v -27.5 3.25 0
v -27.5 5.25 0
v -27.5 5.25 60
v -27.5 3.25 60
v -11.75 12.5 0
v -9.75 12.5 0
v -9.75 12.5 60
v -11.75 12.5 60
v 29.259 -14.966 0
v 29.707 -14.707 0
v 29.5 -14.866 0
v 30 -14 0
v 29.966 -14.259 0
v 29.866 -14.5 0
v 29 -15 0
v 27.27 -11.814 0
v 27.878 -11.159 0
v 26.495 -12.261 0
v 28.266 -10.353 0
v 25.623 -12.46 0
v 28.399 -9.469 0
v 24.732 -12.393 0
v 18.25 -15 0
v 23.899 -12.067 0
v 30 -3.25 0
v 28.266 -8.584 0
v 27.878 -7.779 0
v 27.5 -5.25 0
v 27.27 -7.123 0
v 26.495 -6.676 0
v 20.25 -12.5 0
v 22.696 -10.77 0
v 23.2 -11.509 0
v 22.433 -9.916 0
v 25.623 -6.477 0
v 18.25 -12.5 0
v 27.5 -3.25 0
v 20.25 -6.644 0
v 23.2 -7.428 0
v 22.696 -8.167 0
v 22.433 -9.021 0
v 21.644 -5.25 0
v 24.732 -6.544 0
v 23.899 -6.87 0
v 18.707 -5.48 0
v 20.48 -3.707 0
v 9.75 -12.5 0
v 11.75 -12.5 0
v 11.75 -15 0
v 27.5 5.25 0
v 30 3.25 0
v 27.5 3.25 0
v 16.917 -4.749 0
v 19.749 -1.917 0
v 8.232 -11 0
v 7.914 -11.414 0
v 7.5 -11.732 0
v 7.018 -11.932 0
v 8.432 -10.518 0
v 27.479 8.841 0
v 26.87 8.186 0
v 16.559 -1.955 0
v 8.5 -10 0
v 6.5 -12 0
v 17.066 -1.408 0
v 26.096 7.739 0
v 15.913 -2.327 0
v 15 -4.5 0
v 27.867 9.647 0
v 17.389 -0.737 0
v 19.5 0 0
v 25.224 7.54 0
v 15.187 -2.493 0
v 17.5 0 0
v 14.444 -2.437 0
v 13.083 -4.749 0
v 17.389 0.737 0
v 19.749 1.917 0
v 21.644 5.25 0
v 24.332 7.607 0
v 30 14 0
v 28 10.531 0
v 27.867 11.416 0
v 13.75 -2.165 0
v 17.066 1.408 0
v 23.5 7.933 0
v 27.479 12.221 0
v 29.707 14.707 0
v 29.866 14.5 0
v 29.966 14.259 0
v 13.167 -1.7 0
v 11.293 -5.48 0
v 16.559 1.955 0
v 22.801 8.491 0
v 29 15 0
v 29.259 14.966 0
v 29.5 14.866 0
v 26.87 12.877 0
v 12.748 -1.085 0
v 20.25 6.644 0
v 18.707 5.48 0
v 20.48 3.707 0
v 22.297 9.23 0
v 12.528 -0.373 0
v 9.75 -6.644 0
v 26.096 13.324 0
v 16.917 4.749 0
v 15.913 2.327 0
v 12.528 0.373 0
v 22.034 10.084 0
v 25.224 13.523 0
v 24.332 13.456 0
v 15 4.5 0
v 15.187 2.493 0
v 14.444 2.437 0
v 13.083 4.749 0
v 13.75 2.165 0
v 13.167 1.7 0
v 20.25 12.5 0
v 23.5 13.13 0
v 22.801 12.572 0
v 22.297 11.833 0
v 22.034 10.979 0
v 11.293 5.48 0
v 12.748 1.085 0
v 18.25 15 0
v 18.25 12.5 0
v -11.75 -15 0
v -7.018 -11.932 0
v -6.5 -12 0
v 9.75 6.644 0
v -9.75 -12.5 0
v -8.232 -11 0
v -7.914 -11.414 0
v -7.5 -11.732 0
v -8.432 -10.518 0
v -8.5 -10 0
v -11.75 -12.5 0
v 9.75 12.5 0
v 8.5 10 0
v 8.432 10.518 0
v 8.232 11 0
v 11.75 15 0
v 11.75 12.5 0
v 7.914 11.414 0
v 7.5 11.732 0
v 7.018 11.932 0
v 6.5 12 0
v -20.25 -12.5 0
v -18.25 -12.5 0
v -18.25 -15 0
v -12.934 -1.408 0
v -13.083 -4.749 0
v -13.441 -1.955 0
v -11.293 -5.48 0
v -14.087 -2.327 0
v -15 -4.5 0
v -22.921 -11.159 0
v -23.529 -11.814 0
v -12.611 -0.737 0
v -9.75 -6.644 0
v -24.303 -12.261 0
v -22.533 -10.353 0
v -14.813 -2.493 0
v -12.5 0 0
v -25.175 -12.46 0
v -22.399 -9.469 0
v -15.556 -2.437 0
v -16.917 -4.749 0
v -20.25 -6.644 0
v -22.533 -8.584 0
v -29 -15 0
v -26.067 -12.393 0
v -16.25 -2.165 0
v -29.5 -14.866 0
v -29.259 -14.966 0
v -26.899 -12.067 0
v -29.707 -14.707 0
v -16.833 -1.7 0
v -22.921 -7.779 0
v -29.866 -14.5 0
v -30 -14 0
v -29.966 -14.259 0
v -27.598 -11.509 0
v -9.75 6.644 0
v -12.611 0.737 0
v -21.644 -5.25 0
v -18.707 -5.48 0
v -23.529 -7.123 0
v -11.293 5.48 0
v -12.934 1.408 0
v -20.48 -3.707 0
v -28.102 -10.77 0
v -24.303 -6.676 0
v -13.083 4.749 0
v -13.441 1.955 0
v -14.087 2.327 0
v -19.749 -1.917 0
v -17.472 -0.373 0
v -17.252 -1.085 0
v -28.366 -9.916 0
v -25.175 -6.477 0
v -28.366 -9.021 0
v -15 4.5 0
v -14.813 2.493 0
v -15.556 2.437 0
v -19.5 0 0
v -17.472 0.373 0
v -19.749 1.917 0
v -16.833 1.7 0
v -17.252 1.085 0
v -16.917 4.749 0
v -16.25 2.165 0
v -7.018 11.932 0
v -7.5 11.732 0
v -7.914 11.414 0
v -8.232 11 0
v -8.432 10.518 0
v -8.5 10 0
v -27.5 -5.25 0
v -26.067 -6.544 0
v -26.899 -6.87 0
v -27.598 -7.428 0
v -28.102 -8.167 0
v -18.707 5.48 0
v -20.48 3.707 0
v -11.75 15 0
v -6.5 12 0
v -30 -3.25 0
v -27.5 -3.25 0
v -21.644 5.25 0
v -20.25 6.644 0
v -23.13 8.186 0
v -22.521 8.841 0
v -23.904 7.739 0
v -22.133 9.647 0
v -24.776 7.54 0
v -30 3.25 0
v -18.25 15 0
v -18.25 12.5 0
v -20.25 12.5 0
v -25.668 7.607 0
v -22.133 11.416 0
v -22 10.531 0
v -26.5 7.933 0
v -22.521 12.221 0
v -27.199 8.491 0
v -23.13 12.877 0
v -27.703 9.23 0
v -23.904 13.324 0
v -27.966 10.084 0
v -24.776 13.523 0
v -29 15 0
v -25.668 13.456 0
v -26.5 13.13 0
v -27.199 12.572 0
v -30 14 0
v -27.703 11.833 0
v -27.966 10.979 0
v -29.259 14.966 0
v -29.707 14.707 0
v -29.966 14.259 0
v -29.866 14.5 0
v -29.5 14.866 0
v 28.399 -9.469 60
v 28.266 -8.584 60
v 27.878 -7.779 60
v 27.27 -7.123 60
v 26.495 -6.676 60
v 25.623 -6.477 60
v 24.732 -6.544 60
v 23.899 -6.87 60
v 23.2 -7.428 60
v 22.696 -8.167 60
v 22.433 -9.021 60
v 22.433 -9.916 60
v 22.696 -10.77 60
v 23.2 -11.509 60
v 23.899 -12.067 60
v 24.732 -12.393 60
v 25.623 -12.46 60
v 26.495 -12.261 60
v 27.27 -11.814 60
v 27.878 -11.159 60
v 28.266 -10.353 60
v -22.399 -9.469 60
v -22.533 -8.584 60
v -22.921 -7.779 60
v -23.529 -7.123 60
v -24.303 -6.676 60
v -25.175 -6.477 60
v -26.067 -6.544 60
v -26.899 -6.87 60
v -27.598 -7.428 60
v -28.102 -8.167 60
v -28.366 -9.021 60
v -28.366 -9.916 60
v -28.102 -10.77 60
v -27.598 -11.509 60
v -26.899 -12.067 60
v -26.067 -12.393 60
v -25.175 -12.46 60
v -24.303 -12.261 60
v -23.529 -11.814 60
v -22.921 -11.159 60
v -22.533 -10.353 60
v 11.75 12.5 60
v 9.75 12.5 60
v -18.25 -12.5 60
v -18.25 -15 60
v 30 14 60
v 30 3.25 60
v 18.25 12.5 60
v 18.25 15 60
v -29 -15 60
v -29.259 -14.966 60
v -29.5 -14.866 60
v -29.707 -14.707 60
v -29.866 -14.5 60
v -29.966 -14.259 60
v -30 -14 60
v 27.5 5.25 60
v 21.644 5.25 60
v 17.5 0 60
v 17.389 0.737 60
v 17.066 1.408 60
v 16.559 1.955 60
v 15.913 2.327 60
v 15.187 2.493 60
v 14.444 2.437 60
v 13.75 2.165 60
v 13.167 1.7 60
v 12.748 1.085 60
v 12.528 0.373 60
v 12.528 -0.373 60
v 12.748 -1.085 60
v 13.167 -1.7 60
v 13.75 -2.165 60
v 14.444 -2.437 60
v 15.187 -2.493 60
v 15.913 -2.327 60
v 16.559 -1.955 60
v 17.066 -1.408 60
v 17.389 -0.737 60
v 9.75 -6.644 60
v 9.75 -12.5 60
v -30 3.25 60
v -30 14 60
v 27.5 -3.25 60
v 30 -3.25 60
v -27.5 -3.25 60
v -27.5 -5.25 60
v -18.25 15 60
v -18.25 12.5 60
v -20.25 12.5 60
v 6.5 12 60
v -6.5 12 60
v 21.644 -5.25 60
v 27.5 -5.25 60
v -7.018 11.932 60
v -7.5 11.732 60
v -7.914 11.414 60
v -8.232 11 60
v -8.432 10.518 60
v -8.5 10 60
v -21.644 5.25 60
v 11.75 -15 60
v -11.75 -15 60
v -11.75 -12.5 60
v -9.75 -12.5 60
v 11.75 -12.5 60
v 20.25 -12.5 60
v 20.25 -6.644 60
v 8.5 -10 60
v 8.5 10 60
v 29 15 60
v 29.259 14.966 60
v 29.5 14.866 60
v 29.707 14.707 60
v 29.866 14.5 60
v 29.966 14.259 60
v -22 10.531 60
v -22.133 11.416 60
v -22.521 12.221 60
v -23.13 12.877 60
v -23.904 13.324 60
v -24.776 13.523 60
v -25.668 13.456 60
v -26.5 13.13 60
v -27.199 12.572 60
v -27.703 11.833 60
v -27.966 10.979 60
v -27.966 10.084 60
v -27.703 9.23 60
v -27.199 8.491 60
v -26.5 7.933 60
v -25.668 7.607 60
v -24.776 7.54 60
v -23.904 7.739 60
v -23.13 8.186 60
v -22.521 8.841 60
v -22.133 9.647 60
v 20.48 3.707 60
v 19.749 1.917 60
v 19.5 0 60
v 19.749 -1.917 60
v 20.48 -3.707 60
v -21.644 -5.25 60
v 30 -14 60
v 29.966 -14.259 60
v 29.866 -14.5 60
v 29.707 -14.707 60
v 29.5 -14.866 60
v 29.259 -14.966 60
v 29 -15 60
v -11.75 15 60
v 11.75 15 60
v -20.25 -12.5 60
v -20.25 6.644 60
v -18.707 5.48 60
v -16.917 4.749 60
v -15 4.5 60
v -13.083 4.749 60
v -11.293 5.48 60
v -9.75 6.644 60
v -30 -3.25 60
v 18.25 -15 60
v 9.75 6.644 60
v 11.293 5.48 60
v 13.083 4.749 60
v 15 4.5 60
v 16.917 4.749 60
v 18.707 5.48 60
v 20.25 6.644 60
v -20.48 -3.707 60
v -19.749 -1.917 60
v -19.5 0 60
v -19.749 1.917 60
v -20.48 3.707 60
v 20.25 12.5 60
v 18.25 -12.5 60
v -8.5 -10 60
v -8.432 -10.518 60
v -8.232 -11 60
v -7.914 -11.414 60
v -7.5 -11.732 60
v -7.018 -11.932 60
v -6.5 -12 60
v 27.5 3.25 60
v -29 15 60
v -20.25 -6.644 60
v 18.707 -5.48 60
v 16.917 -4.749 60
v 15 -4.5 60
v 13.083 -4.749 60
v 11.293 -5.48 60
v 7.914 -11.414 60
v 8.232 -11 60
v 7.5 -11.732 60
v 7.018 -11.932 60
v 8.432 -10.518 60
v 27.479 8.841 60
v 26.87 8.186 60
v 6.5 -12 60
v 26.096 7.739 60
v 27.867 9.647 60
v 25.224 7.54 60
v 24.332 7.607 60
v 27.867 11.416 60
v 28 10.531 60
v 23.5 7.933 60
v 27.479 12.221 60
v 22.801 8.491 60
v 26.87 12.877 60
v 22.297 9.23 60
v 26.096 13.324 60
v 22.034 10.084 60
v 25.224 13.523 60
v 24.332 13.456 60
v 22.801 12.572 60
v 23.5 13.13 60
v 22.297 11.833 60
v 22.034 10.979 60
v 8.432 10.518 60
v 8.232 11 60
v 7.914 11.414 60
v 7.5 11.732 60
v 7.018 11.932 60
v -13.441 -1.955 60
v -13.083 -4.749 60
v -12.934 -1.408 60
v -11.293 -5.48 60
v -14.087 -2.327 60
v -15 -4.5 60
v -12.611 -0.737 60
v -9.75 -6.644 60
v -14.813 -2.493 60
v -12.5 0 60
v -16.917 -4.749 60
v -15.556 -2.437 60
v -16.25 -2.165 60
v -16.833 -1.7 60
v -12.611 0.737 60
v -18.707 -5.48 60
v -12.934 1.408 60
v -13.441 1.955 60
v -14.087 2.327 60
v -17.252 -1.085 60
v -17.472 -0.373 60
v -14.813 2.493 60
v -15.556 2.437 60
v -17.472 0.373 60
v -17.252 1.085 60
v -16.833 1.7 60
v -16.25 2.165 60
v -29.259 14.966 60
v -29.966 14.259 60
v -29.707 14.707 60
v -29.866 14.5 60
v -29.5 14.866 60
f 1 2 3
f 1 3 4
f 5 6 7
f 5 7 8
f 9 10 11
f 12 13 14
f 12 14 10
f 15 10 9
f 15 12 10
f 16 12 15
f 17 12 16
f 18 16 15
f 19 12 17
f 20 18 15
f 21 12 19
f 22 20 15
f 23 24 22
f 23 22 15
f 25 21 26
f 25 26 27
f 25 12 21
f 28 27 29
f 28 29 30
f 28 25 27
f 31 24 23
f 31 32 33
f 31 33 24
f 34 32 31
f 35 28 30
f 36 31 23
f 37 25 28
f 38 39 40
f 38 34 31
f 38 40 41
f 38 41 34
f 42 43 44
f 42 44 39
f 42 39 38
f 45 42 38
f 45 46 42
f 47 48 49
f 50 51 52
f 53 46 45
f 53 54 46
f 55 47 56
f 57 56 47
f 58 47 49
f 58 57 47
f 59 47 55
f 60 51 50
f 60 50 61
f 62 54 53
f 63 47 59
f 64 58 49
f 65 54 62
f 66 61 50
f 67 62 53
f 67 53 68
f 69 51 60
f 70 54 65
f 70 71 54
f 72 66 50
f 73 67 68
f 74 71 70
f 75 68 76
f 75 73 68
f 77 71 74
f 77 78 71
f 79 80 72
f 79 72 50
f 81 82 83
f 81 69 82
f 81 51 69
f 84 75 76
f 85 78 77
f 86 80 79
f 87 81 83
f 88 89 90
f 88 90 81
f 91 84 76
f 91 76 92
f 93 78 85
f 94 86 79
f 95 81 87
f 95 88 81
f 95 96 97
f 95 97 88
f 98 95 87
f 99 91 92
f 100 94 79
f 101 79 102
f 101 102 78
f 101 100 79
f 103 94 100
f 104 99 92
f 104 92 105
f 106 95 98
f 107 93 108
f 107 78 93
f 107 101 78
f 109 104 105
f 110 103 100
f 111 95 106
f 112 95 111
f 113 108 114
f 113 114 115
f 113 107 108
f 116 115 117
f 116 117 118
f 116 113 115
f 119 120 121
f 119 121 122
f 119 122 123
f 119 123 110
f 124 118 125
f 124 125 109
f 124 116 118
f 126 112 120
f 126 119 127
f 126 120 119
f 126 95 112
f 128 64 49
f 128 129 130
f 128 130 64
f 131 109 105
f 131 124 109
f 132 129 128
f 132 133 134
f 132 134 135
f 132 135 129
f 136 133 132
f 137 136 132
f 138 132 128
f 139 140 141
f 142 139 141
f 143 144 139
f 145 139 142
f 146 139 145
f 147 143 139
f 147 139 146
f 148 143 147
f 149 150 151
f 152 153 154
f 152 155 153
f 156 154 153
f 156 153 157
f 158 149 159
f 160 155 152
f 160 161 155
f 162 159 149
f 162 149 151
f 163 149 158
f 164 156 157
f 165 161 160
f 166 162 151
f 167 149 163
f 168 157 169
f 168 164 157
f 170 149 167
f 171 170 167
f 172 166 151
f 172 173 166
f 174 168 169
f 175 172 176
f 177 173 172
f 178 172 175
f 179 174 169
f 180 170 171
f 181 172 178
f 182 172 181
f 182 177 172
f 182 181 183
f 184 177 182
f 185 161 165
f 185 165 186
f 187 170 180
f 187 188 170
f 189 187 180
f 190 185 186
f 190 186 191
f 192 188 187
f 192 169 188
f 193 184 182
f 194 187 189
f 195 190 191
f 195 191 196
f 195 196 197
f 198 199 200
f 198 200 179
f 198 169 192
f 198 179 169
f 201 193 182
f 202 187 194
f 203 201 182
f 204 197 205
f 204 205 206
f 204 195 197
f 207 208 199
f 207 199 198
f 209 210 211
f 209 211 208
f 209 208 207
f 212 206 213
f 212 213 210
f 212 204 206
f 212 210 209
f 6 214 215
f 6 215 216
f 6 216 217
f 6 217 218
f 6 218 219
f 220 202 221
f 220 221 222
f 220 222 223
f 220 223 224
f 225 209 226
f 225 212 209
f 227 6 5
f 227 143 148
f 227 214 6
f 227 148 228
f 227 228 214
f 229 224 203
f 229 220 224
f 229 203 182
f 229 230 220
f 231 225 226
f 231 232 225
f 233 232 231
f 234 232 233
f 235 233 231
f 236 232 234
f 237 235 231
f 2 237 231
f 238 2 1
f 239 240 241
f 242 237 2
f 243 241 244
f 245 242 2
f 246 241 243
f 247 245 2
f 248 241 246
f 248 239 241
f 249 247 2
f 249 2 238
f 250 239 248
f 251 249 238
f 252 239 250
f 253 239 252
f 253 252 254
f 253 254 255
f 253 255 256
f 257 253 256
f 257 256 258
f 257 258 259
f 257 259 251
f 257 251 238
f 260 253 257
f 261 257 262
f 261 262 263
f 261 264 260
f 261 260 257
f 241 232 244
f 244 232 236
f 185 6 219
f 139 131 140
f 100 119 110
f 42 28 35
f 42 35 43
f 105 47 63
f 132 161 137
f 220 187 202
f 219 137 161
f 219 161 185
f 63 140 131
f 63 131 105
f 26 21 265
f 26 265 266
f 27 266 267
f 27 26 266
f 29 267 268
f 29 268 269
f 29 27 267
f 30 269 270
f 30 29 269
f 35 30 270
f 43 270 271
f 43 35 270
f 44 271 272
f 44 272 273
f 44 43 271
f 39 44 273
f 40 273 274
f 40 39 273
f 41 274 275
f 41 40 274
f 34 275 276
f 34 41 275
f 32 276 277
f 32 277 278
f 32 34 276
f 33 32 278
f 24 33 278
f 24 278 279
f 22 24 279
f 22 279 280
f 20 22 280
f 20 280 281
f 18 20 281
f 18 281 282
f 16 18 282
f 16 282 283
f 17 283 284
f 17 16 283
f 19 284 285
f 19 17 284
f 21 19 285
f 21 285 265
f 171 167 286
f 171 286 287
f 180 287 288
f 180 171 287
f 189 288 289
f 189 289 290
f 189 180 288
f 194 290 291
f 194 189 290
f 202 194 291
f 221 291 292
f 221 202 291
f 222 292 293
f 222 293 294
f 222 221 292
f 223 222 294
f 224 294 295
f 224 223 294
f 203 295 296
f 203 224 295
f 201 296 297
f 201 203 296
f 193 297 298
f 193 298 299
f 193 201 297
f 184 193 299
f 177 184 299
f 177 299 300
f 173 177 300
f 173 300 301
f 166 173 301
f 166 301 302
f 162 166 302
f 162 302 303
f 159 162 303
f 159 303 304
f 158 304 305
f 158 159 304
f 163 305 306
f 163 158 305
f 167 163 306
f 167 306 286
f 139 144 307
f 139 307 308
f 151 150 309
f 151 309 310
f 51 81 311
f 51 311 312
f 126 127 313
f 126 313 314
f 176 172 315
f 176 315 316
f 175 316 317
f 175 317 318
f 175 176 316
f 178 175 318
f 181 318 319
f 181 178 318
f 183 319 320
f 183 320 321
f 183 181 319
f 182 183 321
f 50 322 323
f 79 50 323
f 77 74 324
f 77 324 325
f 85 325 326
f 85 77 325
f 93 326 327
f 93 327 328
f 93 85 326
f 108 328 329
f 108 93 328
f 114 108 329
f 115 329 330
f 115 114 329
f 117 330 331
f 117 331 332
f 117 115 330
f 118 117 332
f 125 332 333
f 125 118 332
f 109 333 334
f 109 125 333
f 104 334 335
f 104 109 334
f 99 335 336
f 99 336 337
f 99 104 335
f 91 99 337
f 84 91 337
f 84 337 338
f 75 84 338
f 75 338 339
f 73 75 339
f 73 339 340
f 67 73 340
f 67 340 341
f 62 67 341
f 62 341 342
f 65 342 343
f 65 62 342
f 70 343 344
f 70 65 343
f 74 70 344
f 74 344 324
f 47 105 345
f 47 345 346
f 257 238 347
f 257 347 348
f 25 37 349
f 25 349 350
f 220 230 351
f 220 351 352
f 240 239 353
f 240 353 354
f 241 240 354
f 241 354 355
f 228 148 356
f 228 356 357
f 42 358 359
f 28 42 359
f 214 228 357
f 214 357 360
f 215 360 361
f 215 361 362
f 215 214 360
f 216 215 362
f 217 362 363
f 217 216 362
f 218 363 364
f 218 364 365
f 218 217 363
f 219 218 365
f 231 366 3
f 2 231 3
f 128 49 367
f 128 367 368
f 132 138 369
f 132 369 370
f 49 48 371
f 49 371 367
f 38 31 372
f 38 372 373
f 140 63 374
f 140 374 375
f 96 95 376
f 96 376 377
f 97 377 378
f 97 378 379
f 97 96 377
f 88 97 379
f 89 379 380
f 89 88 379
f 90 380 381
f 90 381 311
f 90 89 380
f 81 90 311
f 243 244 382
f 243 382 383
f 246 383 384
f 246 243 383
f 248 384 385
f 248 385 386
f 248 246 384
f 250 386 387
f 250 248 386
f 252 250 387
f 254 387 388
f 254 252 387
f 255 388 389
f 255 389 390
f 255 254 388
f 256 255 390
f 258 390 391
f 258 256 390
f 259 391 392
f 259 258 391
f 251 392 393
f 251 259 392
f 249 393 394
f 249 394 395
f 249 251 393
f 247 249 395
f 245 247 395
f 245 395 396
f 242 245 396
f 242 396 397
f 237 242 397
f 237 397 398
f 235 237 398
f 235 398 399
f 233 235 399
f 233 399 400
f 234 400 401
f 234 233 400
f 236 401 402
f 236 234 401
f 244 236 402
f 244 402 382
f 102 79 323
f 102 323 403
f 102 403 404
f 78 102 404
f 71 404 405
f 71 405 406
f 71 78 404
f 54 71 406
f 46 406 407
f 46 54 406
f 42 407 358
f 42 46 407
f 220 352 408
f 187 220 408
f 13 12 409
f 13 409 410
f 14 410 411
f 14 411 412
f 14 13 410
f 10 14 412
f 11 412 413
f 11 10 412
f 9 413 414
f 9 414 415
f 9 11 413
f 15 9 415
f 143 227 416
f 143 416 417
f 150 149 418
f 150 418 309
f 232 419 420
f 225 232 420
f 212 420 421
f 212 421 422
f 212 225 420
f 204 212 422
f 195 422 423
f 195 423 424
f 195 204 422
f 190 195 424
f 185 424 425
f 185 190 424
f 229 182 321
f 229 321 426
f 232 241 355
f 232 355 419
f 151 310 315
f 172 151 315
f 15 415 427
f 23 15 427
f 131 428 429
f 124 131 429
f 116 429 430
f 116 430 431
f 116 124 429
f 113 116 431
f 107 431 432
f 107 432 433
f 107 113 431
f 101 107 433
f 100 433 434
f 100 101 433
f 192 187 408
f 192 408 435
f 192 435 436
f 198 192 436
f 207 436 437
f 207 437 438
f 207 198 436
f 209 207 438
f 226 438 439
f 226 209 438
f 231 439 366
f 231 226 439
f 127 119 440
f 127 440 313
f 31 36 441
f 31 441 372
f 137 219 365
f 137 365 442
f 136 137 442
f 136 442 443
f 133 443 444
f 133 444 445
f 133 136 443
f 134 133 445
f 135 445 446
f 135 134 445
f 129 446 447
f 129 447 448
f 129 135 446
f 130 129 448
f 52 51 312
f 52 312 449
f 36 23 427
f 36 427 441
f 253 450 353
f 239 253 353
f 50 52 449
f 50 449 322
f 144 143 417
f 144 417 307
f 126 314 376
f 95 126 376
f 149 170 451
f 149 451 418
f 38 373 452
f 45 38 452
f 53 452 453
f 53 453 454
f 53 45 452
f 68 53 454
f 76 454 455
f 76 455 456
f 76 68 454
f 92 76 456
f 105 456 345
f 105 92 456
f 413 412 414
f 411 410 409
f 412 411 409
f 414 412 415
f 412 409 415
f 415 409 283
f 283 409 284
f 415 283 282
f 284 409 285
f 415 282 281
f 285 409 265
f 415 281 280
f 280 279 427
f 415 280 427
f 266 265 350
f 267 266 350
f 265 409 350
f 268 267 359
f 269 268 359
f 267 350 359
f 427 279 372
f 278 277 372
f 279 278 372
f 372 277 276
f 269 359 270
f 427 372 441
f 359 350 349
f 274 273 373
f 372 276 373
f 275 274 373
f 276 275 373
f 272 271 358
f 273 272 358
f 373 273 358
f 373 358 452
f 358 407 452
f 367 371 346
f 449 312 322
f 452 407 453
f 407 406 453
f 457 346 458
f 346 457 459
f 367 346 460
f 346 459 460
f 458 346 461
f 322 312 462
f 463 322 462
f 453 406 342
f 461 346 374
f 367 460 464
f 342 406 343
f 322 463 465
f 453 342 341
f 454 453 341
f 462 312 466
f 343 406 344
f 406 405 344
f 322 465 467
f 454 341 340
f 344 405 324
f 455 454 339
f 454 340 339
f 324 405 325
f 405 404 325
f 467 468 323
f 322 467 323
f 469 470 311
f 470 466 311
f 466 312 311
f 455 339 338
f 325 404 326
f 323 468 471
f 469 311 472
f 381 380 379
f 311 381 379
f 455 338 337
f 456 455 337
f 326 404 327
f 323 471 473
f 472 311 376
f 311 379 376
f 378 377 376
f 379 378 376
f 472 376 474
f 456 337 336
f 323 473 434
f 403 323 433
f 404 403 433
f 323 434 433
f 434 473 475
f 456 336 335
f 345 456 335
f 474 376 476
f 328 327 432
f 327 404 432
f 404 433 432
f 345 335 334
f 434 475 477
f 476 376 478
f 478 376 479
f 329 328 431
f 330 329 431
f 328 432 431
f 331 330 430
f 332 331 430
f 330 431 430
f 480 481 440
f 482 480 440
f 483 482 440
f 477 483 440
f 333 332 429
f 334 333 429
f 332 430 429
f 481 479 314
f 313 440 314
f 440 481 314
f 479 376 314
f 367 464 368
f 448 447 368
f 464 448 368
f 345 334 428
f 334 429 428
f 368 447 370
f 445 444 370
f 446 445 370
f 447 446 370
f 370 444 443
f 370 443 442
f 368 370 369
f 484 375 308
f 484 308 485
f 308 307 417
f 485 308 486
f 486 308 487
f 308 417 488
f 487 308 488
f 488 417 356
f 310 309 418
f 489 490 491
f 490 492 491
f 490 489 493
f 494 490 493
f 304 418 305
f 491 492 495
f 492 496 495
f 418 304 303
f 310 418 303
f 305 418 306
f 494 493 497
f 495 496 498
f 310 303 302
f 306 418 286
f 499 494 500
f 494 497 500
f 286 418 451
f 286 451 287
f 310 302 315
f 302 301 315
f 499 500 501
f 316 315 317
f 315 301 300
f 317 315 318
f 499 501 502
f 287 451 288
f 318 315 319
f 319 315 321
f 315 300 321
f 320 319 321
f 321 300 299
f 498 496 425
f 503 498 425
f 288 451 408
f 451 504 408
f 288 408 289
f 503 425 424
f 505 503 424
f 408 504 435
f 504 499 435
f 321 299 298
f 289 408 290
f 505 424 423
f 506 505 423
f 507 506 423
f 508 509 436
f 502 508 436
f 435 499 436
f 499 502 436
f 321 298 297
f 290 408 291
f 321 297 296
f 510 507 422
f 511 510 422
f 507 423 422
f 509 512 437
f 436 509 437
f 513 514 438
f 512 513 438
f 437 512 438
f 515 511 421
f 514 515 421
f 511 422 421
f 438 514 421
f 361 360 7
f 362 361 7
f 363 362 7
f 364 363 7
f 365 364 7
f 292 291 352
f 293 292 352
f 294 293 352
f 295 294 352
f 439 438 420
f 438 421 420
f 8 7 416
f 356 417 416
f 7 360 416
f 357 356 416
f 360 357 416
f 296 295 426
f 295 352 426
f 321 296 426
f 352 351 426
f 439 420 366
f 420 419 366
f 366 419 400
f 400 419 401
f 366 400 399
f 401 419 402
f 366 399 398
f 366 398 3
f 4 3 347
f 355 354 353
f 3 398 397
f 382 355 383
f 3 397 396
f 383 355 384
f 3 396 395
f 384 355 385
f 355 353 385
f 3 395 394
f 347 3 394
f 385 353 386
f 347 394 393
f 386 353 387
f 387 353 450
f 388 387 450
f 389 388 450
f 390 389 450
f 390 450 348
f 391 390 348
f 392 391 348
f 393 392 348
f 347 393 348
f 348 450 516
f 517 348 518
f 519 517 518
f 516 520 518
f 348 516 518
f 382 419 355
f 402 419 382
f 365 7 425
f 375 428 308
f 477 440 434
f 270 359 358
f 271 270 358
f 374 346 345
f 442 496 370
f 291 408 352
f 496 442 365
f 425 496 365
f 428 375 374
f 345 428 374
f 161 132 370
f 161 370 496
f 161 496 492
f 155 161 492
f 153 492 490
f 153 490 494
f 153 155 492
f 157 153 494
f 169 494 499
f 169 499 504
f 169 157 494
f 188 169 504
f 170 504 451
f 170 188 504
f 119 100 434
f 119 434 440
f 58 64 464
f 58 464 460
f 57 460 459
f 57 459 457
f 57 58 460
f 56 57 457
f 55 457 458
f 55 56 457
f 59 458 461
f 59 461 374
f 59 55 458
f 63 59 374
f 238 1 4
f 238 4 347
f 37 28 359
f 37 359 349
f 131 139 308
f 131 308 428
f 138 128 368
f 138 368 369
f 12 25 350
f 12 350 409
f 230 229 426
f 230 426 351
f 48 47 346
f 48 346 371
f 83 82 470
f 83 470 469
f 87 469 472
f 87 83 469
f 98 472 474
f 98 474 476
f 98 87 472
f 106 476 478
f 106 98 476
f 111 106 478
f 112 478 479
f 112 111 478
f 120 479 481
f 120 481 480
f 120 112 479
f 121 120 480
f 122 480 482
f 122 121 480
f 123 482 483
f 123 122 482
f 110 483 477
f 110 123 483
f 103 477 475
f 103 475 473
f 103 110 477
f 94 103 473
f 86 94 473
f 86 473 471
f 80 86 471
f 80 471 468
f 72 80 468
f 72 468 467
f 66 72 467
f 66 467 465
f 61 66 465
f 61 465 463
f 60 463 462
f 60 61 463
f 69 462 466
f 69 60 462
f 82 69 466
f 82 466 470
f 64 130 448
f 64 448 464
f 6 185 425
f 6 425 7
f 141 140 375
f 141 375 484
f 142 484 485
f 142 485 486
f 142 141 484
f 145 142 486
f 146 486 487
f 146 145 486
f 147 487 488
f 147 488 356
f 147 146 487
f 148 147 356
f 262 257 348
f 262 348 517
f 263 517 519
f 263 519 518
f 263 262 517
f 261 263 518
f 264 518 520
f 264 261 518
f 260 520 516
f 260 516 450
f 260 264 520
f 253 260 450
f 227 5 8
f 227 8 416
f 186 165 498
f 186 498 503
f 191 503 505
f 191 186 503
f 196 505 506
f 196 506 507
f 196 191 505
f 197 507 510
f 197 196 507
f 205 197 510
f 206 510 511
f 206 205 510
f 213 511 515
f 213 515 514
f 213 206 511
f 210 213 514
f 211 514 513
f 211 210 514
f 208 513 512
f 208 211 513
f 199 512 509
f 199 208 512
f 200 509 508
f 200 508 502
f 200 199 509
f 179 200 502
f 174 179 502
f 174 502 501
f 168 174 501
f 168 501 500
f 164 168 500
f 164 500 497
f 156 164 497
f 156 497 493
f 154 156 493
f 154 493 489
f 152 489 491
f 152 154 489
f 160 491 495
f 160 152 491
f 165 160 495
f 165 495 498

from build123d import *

# Parameters (mm, degrees)
MODEL_R             = 2.5
MODEL_R_2           = 3
BOSS_EXTRUDE1_DEPTH = 60


with BuildPart() as part:
    # Model → Boss-Extrude1 (new body)
    with BuildSketch(Plane.XY):
        with BuildLine():
            Line((-27.5, 3.25), (-30, 3.25))
            Line((-30, 3.25), (-30, 14))
            ThreePointArc((-30, 14), (-29.707106781, 14.707106781), (-29, 15))
            Line((-29, 15), (-18.25, 15))
            Line((-18.25, 15), (-18.25, 12.5))
            Line((-18.25, 12.5), (-20.25, 12.5))
            Line((-20.25, 12.5), (-20.25, 6.643928679))
            ThreePointArc((-20.25, 6.643928679), (-15, 4.5), (-9.75, 6.643928679))
            Line((-9.75, 6.643928679), (-9.75, 12.5))
            Line((-9.75, 12.5), (-11.75, 12.5))
            Line((-11.75, 12.5), (-11.75, 15))
            Line((-11.75, 15), (11.75, 15))
            Line((11.75, 15), (11.75, 12.5))
            Line((11.75, 12.5), (9.75, 12.5))
            Line((9.75, 12.5), (9.75, 6.643928679))
            ThreePointArc((9.75, 6.643928679), (15, 4.5), (20.25, 6.643928679))
            Line((20.25, 6.643928679), (20.25, 12.5))
            Line((20.25, 12.5), (18.25, 12.5))
            Line((18.25, 12.5), (18.25, 15))
            Line((18.25, 15), (29, 15))
            ThreePointArc((29, 15), (29.707106781, 14.707106781), (30, 14))
            Line((30, 14), (30, 3.25))
            Line((30, 3.25), (27.5, 3.25))
            Line((27.5, 3.25), (27.5, 5.25))
            Line((27.5, 5.25), (21.643928679, 5.25))
            ThreePointArc((21.643928679, 5.25), (19.5, 0), (21.643928679, -5.25))
            Line((21.643928679, -5.25), (27.5, -5.25))
            Line((27.5, -5.25), (27.5, -3.25))
            Line((27.5, -3.25), (30, -3.25))
            Line((30, -3.25), (30, -14))
            ThreePointArc((30, -14), (29.707106781, -14.707106781), (29, -15))
            Line((29, -15), (18.25, -15))
            Line((18.25, -15), (18.25, -12.5))
            Line((18.25, -12.5), (20.25, -12.5))
            Line((20.25, -12.5), (20.25, -6.643928679))
            ThreePointArc((20.25, -6.643928679), (15, -4.5), (9.75, -6.643928679))
            Line((9.75, -6.643928679), (9.75, -12.5))
            Line((9.75, -12.5), (11.75, -12.5))
            Line((11.75, -12.5), (11.75, -15))
            Line((11.75, -15), (-11.75, -15))
            Line((-11.75, -15), (-11.75, -12.5))
            Line((-11.75, -12.5), (-9.75, -12.5))
            Line((-9.75, -12.5), (-9.75, -6.643928679))
            ThreePointArc((-9.75, -6.643928679), (-15, -4.5), (-20.25, -6.643928679))
            Line((-20.25, -6.643928679), (-20.25, -12.5))
            Line((-20.25, -12.5), (-18.25, -12.5))
            Line((-18.25, -12.5), (-18.25, -15))
            Line((-18.25, -15), (-29, -15))
            ThreePointArc((-29, -15), (-29.707106781, -14.707106781), (-30, -14))
            Line((-30, -14), (-30, -3.25))
            Line((-30, -3.25), (-27.5, -3.25))
            Line((-27.5, -3.25), (-27.5, -5.25))
            Line((-27.5, -5.25), (-21.643928679, -5.25))
            ThreePointArc((-21.643928679, -5.25), (-19.5, 0), (-21.643928679, 5.25))
            Line((-21.643928679, 5.25), (-27.5, 5.25))
            Line((-27.5, 5.25), (-27.5, 3.25))
        make_face()
        with Locations((-15, 0)):
            Circle(MODEL_R, mode=Mode.SUBTRACT)
        with Locations((-25, 10.531430074)):
            Circle(MODEL_R_2, mode=Mode.SUBTRACT)
        with Locations((-25.399251578, -9.468569926)):
            Circle(MODEL_R_2, mode=Mode.SUBTRACT)
        with Locations((25.399251578, -9.468569926)):
            Circle(MODEL_R_2, mode=Mode.SUBTRACT)
        with Locations((15, 0)):
            Circle(MODEL_R, mode=Mode.SUBTRACT)
        with Locations((25, 10.531430074)):
            Circle(MODEL_R_2, mode=Mode.SUBTRACT)
        with BuildLine():
            Line((6.5, 12), (-6.5, 12))
            ThreePointArc((-6.5, 12), (-7.914213562, 11.414213562), (-8.5, 10))
            Line((-8.5, 10), (-8.5, -10))
            ThreePointArc((-8.5, -10), (-7.914213562, -11.414213562), (-6.5, -12))
            Line((-6.5, -12), (6.5, -12))
            ThreePointArc((6.5, -12), (7.914213562, -11.414213562), (8.5, -10))
            Line((8.5, -10), (8.5, 10))
            ThreePointArc((8.5, 10), (7.914213562, 11.414213562), (6.5, 12))
        make_face(mode=Mode.SUBTRACT)
    extrude(amount=BOSS_EXTRUDE1_DEPTH)


solid = part.part
